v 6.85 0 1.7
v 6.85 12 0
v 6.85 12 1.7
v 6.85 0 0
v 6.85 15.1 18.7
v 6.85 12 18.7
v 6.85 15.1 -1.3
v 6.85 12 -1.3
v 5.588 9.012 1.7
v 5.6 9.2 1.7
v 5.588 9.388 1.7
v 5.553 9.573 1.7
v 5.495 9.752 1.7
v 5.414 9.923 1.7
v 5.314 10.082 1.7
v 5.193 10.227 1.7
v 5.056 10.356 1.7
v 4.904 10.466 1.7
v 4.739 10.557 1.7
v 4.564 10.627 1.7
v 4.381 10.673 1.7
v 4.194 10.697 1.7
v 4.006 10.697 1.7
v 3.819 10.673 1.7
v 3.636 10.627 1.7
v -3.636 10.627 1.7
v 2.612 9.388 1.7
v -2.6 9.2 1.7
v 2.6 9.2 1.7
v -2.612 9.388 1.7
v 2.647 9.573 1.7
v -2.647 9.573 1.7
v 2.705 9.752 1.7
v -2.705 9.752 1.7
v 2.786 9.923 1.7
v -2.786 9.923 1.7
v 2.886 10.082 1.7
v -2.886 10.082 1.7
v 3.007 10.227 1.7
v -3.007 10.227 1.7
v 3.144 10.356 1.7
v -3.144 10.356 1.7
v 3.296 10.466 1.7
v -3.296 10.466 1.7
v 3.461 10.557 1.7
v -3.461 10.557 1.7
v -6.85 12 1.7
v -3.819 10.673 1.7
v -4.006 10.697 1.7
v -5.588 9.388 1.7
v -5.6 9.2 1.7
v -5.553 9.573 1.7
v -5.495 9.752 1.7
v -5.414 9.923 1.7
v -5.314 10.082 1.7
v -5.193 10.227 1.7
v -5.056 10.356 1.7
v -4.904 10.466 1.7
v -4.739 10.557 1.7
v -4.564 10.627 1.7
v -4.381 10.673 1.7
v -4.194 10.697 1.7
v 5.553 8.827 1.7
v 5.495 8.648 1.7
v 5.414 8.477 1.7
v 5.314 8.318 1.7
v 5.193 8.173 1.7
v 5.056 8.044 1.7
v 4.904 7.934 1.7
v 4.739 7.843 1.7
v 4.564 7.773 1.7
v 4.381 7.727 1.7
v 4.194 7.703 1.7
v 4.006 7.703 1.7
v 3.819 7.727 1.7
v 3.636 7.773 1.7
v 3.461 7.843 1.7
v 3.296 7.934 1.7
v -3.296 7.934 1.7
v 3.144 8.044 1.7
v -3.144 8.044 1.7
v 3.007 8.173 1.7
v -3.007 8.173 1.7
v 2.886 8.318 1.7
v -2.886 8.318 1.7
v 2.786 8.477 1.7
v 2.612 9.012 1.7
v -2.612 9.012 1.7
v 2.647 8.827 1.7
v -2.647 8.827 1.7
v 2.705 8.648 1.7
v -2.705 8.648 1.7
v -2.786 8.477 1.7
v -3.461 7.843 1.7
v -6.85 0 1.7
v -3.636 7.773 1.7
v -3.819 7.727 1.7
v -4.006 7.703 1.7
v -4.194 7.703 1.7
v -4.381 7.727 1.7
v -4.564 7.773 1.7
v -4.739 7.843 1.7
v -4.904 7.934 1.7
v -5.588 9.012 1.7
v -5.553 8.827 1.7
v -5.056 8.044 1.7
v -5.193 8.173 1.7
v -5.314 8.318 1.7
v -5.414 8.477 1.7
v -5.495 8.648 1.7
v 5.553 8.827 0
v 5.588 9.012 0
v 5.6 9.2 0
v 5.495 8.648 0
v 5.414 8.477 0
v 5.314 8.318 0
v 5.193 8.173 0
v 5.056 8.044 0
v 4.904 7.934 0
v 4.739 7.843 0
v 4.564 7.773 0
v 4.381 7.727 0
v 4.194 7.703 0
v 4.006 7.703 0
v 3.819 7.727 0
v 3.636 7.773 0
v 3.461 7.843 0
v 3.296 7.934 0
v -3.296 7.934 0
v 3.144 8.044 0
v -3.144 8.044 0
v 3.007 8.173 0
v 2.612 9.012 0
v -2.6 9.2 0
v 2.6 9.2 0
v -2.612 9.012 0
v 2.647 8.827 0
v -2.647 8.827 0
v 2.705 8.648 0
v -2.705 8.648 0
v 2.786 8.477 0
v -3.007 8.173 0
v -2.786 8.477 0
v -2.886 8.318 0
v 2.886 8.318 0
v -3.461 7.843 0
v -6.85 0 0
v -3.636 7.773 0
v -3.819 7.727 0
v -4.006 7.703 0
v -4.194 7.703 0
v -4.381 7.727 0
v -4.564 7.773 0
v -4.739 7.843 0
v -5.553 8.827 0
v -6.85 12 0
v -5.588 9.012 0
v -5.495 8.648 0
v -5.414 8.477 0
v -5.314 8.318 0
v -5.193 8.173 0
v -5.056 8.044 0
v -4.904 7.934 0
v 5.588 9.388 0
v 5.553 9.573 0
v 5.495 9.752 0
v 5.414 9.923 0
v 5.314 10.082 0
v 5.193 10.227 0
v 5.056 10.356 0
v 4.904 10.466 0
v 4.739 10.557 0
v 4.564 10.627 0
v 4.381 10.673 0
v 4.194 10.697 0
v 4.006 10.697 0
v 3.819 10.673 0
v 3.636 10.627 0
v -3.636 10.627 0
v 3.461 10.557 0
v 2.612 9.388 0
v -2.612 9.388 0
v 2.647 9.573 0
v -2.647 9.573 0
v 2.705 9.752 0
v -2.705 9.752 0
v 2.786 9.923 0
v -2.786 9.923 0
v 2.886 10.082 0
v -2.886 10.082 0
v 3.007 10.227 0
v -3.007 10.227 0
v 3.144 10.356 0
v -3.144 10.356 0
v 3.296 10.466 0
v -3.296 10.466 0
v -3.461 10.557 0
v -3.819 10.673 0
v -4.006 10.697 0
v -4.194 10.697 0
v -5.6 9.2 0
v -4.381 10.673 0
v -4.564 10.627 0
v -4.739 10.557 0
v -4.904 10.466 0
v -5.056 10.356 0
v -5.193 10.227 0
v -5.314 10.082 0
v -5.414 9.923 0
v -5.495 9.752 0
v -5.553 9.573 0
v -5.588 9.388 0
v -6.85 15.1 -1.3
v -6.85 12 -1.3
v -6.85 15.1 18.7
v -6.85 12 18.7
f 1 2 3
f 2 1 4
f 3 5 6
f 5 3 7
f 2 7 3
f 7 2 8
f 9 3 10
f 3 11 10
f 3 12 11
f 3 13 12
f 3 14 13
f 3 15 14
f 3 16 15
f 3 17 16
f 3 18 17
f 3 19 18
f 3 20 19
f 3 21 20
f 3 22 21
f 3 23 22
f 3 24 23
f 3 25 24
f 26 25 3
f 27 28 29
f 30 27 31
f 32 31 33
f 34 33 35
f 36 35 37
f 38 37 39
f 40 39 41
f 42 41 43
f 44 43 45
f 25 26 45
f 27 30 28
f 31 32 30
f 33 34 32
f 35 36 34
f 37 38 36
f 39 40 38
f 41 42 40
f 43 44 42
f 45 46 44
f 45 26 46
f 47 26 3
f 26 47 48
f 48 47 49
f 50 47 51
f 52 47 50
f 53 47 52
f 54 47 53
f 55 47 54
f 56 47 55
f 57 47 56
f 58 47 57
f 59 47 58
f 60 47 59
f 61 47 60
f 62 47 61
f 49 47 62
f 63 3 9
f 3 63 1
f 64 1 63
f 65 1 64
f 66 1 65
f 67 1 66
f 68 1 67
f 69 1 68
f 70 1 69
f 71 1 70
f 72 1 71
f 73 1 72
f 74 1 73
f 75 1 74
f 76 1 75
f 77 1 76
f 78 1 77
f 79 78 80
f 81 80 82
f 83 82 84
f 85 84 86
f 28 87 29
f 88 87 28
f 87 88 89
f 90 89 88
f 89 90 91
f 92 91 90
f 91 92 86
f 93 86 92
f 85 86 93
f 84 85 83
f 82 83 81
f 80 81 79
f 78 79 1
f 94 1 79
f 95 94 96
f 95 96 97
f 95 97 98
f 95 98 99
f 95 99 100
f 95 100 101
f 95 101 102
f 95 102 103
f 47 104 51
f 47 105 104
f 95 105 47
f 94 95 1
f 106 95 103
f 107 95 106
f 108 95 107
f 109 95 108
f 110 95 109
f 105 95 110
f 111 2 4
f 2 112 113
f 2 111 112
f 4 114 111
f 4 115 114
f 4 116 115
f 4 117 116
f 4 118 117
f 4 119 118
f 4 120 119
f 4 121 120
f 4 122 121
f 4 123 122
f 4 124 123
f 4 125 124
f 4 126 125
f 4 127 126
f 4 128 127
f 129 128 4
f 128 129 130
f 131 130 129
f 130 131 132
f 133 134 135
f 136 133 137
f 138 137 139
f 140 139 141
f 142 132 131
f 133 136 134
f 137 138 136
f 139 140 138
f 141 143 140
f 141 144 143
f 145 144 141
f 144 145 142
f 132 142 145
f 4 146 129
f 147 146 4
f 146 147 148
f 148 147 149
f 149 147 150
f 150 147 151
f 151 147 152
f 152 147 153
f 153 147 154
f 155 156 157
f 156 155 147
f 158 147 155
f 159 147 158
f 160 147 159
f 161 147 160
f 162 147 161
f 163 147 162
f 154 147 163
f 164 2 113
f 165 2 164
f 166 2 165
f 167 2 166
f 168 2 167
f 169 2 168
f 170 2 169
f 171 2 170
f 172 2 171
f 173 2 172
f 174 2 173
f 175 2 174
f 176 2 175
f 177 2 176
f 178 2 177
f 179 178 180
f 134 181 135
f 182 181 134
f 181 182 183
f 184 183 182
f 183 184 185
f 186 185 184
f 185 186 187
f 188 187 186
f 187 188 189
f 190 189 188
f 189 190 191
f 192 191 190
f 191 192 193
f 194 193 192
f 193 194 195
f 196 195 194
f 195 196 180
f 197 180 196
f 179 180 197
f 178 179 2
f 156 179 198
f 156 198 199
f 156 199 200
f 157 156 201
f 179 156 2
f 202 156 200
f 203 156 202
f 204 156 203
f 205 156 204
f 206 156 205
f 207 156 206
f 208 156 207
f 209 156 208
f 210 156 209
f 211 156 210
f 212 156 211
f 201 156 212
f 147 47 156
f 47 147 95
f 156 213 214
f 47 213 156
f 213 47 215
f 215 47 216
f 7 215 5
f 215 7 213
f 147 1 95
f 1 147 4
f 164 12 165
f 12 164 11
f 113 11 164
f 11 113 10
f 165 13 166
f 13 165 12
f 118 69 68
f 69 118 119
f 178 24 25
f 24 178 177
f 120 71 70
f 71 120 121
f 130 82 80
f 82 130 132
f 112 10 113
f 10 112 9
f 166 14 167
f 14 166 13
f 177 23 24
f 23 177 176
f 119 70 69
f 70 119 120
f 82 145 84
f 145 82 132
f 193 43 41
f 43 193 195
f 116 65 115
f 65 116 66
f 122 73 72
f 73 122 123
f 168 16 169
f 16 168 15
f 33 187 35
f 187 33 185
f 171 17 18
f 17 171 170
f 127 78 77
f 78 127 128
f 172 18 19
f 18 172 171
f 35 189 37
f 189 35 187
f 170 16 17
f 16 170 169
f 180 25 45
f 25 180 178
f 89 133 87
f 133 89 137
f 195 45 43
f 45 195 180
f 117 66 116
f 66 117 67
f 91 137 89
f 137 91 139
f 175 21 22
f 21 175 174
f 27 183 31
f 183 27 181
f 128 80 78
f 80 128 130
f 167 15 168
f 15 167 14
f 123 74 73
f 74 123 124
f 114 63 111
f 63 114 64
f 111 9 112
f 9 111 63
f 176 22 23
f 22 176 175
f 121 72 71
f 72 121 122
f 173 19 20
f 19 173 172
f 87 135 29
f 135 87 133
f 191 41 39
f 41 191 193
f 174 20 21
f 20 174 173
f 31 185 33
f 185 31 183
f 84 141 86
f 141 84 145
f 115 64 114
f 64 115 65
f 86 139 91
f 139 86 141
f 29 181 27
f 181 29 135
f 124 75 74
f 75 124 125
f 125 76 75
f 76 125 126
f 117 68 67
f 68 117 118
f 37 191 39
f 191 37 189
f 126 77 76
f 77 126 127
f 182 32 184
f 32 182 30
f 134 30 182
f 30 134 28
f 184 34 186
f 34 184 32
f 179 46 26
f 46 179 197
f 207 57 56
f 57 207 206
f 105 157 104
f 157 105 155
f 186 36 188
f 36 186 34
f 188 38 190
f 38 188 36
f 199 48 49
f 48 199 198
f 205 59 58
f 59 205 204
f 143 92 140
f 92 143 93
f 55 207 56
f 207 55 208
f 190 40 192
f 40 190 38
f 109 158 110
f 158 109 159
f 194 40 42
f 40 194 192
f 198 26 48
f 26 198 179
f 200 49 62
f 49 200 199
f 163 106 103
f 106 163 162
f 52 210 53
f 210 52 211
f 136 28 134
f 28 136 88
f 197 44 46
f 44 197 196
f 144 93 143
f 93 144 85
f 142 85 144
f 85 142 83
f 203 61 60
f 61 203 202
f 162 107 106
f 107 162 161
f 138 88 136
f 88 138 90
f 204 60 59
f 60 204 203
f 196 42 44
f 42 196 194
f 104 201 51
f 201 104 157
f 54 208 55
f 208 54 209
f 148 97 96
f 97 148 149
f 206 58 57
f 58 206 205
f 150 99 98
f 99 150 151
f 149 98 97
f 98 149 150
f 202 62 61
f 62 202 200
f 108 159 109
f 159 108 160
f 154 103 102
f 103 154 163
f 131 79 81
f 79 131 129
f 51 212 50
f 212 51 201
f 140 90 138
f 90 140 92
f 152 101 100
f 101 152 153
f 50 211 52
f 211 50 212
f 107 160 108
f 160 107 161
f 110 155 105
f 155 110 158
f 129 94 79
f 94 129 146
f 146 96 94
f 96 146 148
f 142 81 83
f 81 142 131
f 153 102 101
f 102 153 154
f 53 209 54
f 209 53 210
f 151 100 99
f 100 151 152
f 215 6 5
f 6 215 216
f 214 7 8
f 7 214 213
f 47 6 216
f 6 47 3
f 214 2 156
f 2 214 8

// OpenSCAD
/*
Copyright 2018 Michael Gläser

Licensed under the Apache License, Version 2.0 (the "License");
you may not use this file except in compliance with the License.
You may obtain a copy of the License at

    http://www.apache.org/licenses/LICENSE-2.0

Unless required by applicable law or agreed to in writing, software
distributed under the License is distributed on an "AS IS" BASIS,
WITHOUT WARRANTIES OR CONDITIONS OF ANY KIND, either express or implied.
See the License for the specific language governing permissions and
limitations under the License.
*/

// PCB Technical Data
pcbWidth = 13.7;
pcbDepth = 15.1;
pcbHeight = 1.7;



module pcb() {
    $fn = 50;
    holeDiameter = 3.0;
    holeDistanceX = 8.2; // distance between both holes
    holeDistanceY = 9.2; // distance from pcb border
    
    difference() {
        translate([-pcbWidth/2,0,0]) {
            cube([pcbWidth, pcbDepth, pcbHeight]);
        };
        translate([holeDistanceX/2,holeDistanceY,0]) {
            cylinder(h=pcbHeight, r=holeDiameter/2);
        };
        translate([-holeDistanceX/2,holeDistanceY,0]) {
            cylinder(h=pcbHeight, r=holeDiameter/2);
        };
    };
}

module pcbHeader(side="up") {
    width = pcbWidth;
    depth = 3.1;
    height = 20.0;
    
    if (side=="up") {
        translate([-width/2,12,-1.3]) {
            cube([width,depth,height]);  
        };
    } else {
        translate([-wth/2,12,-height+pcbHeight+1.3]) {
            cube([width,depth,height]);  
        };
    };
};

module usbHeader() {


};

module usbMount() {
    
    pcb();
    pcbHeader("up");
    usbHeader();
}

usbMount();
